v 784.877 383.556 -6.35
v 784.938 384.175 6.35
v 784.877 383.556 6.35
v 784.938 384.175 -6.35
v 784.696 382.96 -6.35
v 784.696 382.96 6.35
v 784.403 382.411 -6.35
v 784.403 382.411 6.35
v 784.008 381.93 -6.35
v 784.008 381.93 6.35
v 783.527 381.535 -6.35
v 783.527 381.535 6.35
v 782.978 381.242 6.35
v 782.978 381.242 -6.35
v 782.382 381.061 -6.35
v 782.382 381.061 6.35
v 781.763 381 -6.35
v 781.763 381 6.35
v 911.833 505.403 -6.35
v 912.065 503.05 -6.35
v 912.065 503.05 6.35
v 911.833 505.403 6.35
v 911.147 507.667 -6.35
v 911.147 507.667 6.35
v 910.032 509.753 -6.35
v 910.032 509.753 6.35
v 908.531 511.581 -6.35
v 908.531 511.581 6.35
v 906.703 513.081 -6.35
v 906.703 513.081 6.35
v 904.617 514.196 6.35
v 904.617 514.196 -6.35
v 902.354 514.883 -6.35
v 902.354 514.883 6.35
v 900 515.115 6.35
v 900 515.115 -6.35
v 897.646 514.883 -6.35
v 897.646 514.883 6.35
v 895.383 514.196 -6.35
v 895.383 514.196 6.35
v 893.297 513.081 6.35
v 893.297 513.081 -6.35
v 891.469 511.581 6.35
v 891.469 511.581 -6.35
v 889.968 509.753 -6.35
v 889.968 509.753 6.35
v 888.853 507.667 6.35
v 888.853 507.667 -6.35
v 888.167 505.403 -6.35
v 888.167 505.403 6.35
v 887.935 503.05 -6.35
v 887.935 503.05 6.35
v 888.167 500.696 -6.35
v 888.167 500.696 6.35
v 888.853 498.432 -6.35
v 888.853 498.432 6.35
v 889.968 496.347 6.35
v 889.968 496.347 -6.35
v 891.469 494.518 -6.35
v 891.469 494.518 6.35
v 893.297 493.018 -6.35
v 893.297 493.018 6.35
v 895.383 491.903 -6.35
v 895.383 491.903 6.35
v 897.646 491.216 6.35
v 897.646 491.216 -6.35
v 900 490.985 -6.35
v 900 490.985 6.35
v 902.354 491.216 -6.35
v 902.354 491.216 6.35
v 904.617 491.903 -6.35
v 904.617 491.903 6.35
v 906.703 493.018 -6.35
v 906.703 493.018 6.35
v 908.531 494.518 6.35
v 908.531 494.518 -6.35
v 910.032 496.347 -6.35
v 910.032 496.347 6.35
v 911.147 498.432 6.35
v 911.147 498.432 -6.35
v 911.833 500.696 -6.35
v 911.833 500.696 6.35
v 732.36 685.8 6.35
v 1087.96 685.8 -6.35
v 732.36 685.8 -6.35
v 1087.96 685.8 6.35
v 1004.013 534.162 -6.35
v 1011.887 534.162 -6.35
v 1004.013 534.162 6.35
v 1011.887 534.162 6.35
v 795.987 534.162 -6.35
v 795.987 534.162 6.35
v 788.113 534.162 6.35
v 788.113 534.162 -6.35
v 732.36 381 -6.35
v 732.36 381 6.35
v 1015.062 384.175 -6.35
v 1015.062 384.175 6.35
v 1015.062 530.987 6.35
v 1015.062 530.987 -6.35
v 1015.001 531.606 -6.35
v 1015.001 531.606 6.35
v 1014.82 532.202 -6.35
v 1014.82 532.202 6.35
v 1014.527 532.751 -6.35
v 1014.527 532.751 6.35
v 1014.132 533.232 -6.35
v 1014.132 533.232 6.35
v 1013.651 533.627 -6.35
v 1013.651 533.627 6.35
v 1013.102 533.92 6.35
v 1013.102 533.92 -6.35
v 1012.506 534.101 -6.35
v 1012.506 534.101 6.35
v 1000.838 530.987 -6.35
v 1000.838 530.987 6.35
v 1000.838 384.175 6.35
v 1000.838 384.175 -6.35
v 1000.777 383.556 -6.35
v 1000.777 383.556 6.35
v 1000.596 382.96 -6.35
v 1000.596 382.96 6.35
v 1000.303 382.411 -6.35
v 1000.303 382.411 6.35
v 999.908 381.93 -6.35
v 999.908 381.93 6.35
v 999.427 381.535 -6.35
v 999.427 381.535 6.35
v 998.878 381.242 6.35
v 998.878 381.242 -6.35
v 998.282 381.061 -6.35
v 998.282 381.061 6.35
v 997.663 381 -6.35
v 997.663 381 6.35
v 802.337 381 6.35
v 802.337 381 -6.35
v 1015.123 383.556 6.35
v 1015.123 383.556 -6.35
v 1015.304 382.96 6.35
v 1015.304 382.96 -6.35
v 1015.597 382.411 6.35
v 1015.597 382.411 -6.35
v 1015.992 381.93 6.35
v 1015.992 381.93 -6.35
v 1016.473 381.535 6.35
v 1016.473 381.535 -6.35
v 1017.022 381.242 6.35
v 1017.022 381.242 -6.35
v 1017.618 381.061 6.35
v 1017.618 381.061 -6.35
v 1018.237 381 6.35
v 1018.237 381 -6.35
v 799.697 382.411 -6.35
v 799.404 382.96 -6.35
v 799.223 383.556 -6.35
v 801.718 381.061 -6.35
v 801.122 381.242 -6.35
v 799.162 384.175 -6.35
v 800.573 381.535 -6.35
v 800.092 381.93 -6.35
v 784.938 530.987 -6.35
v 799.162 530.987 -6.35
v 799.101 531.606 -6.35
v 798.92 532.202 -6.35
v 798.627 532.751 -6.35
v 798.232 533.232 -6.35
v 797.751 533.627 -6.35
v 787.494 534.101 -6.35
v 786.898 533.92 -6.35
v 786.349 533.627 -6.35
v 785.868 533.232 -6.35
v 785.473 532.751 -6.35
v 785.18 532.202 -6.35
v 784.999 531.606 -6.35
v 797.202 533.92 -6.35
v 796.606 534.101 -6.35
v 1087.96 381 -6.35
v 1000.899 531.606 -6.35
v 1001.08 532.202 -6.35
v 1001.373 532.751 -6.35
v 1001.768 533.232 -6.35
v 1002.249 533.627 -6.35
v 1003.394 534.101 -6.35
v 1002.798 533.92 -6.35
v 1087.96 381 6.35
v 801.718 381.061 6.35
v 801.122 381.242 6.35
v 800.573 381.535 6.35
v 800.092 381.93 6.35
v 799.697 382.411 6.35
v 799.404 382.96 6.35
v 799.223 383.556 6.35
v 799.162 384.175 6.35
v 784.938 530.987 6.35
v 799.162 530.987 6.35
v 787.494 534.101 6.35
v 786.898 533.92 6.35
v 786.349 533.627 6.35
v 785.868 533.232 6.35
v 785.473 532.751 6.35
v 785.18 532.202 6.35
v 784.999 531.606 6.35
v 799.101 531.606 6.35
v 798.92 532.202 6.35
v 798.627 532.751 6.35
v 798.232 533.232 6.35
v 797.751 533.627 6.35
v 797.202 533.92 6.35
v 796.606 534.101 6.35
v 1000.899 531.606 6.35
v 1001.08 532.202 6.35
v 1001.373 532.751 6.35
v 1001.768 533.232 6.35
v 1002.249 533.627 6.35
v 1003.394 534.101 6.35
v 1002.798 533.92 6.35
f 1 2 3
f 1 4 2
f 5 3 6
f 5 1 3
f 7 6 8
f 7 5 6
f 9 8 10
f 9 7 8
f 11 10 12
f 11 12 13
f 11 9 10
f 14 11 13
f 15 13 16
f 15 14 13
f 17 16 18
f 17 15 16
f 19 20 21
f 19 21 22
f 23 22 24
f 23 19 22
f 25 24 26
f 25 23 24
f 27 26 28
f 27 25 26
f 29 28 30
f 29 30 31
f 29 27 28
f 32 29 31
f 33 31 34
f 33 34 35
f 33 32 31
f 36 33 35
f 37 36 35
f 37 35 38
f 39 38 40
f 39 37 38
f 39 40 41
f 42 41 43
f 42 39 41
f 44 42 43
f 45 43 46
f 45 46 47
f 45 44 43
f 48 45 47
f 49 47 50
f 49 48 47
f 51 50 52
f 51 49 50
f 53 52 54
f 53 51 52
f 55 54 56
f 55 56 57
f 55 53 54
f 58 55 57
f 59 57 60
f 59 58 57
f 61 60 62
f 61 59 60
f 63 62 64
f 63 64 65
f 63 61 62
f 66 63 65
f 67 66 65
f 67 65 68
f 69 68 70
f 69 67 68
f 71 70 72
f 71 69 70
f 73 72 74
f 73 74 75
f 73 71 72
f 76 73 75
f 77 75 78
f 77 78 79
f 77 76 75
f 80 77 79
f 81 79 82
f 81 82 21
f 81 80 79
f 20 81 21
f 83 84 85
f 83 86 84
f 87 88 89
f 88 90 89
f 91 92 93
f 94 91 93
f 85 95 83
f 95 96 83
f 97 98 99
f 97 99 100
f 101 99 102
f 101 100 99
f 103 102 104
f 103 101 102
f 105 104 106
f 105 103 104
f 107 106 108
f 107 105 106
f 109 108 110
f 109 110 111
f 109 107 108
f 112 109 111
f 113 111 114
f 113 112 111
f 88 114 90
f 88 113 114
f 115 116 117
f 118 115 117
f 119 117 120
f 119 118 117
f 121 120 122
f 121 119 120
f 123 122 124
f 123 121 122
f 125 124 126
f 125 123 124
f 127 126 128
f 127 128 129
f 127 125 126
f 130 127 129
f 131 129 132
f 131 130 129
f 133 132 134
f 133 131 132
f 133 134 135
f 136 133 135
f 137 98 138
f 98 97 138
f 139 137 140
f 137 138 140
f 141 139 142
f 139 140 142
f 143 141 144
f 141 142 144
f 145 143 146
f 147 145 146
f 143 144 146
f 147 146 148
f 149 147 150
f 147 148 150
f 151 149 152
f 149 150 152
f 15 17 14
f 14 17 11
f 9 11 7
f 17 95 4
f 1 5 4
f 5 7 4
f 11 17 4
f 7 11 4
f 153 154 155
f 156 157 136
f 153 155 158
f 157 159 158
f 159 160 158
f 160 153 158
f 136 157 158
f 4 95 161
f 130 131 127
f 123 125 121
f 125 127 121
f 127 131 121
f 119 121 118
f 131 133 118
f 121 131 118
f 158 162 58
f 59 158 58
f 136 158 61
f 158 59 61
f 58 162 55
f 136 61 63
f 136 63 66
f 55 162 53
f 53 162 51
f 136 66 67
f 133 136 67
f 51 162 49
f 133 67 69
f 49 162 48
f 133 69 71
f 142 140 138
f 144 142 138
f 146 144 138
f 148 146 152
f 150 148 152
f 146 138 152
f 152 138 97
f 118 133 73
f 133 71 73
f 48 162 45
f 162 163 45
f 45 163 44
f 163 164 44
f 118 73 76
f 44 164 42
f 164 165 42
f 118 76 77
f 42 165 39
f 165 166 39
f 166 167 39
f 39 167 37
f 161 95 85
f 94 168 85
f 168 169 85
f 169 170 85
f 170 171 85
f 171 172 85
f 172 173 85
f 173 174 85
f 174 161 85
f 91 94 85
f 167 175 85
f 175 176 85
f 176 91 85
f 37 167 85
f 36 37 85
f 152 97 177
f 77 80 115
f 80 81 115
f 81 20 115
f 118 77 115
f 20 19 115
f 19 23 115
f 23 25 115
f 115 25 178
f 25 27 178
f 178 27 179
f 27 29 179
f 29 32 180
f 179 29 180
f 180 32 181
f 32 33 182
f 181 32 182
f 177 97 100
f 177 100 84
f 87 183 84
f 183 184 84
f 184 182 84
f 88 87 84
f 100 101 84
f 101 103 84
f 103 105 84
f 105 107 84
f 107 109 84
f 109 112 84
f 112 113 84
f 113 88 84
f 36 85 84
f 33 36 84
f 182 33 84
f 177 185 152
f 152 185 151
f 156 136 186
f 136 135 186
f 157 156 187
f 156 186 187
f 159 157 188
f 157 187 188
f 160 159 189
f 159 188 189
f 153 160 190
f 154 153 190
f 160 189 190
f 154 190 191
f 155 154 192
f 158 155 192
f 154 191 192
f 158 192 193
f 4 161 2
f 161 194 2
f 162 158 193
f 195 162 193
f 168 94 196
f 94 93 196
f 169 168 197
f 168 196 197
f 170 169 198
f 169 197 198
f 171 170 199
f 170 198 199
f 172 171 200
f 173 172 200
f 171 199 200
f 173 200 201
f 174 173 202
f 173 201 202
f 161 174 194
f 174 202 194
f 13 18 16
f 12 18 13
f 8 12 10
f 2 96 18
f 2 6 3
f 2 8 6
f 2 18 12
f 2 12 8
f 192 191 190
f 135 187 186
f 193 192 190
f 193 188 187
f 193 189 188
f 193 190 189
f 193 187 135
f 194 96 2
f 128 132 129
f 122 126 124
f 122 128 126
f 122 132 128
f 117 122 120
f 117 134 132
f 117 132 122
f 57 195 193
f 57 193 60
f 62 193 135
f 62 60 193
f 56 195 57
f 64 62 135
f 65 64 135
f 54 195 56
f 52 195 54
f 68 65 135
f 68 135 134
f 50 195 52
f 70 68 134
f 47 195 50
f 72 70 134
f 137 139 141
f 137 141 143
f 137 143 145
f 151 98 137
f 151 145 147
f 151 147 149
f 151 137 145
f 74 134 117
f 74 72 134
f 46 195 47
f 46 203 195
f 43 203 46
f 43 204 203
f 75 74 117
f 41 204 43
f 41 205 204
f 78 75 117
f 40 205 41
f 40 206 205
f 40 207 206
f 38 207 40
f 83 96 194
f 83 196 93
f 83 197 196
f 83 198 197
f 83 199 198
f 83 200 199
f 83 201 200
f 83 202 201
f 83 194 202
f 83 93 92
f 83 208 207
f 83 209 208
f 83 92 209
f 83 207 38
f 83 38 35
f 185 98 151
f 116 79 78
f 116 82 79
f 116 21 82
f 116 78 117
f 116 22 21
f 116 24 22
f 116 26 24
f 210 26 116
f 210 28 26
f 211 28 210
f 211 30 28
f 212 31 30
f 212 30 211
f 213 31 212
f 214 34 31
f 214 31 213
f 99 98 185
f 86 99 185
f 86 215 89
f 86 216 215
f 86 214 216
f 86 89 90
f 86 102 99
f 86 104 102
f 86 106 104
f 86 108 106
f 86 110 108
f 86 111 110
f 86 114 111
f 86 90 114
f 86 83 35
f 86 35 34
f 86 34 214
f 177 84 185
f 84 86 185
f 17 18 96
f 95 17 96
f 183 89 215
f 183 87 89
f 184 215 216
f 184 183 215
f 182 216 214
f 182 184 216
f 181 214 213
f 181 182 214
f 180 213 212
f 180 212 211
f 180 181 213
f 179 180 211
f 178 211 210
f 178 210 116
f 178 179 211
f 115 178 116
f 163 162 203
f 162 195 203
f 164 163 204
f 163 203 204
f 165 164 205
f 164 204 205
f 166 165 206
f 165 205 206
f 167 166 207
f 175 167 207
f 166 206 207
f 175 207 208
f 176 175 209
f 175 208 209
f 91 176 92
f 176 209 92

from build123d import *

# Parameters (mm, degrees)
BOSS_EXTRUDE1_DEPTH = 6.35
CAVITY1_START       = -6.35
CAVITY1_OUTLINE_R   = 12.7
CAVITY1_DEPTH       = 12.7
MOVE_FACE_SLOT_BY   = 0.762
MOVE_FACE_SLOT_2_BY = 0.762
MOVE_FACE_SLOT_3_BY = 0.762
MOVE_FACE_SLOT_4_BY = 0.762
MOVE_FACE_SLOT_5_BY = 0.762
MOVE_FACE_SLOT_6_BY = 0.762
MOVE_FACE_HOLE_BY   = 0.635
SLOT_FILLET_R       = 3.175


# Read off the part's stored shape, not the designer's step: Cavity1
with BuildPart() as part:
    # Sketch1 → Boss-Extrude1 (new, symmetric)
    with BuildSketch(Plane.XY):
        Polygon((785.7, 533.4), (785.7, 381), (732.36, 381), (732.36, 685.8), (785.7, 685.8), (1001.6, 685.8), (1087.96, 685.8), (1087.96, 381), (1014.3, 381), (1014.3, 533.4), (1001.6, 533.4), (1001.6, 381), (798.4, 381), (798.4, 533.4), align=None)
    extrude(amount=BOSS_EXTRUDE1_DEPTH, both=True)

    # Cavity1 outline → Cavity1 (cut)
    with BuildSketch(Plane.XY.offset(CAVITY1_START)):
        with Locations((900, 503.049546279)):
            Circle(CAVITY1_OUTLINE_R)
    extrude(amount=CAVITY1_DEPTH, mode=Mode.SUBTRACT)

    # Move Face Slot: a face moved inward by 0.762
    extrude(part.faces().sort_by_distance((1007.95, 533.4, 0))[0], amount=MOVE_FACE_SLOT_BY, dir=(0, 1, 0), mode=Mode.SUBTRACT)

    # Move Face Slot 2: a face moved inward by 0.762
    extrude(part.faces().sort_by_distance((1014.3, 457.2, 0))[0], amount=MOVE_FACE_SLOT_2_BY, dir=(1, 0, 0), mode=Mode.SUBTRACT)

    # Move Face Slot 3: a face moved inward by 0.762
    extrude(part.faces().sort_by_distance((792.05, 533.4, 0))[0], amount=MOVE_FACE_SLOT_3_BY, dir=(0, 1, 0), mode=Mode.SUBTRACT)

    # Move Face Slot 4: a face moved inward by 0.762
    extrude(part.faces().sort_by_distance((798.4, 457.2, 0))[0], amount=MOVE_FACE_SLOT_4_BY, dir=(1, 0, 0), mode=Mode.SUBTRACT)

    # Move Face Slot 5: a face moved inward by 0.762
    extrude(part.faces().sort_by_distance((785.7, 457.2, 0))[0], amount=MOVE_FACE_SLOT_5_BY, dir=(-1, 0, 0), mode=Mode.SUBTRACT)

    # Move Face Slot 6: a face moved inward by 0.762
    extrude(part.faces().sort_by_distance((1001.6, 457.2, 0))[0], amount=MOVE_FACE_SLOT_6_BY, dir=(-1, 0, 0), mode=Mode.SUBTRACT)

    # Move Face Hole: a curved face moved outward by 0.635
    add(Solid.thicken(part.faces().sort_by_distance((887.3, 503.049546279, 0))[0], MOVE_FACE_HOLE_BY))

    # Slot Fillet
    slot_fillet_edges = [part.edges().sort_by_distance(p)[0] for p in [
        (784.938, 381, 0),
        (784.938, 534.162, 0),
        (799.162, 534.162, 0),
        (799.162, 381, 0),
        (1000.838, 381, 0),
        (1000.838, 534.162, 0),
        (1015.062, 534.162, 0),
        (1015.062, 381, 0),
    ]]
    fillet(slot_fillet_edges, radius=SLOT_FILLET_R)


solid = part.part
